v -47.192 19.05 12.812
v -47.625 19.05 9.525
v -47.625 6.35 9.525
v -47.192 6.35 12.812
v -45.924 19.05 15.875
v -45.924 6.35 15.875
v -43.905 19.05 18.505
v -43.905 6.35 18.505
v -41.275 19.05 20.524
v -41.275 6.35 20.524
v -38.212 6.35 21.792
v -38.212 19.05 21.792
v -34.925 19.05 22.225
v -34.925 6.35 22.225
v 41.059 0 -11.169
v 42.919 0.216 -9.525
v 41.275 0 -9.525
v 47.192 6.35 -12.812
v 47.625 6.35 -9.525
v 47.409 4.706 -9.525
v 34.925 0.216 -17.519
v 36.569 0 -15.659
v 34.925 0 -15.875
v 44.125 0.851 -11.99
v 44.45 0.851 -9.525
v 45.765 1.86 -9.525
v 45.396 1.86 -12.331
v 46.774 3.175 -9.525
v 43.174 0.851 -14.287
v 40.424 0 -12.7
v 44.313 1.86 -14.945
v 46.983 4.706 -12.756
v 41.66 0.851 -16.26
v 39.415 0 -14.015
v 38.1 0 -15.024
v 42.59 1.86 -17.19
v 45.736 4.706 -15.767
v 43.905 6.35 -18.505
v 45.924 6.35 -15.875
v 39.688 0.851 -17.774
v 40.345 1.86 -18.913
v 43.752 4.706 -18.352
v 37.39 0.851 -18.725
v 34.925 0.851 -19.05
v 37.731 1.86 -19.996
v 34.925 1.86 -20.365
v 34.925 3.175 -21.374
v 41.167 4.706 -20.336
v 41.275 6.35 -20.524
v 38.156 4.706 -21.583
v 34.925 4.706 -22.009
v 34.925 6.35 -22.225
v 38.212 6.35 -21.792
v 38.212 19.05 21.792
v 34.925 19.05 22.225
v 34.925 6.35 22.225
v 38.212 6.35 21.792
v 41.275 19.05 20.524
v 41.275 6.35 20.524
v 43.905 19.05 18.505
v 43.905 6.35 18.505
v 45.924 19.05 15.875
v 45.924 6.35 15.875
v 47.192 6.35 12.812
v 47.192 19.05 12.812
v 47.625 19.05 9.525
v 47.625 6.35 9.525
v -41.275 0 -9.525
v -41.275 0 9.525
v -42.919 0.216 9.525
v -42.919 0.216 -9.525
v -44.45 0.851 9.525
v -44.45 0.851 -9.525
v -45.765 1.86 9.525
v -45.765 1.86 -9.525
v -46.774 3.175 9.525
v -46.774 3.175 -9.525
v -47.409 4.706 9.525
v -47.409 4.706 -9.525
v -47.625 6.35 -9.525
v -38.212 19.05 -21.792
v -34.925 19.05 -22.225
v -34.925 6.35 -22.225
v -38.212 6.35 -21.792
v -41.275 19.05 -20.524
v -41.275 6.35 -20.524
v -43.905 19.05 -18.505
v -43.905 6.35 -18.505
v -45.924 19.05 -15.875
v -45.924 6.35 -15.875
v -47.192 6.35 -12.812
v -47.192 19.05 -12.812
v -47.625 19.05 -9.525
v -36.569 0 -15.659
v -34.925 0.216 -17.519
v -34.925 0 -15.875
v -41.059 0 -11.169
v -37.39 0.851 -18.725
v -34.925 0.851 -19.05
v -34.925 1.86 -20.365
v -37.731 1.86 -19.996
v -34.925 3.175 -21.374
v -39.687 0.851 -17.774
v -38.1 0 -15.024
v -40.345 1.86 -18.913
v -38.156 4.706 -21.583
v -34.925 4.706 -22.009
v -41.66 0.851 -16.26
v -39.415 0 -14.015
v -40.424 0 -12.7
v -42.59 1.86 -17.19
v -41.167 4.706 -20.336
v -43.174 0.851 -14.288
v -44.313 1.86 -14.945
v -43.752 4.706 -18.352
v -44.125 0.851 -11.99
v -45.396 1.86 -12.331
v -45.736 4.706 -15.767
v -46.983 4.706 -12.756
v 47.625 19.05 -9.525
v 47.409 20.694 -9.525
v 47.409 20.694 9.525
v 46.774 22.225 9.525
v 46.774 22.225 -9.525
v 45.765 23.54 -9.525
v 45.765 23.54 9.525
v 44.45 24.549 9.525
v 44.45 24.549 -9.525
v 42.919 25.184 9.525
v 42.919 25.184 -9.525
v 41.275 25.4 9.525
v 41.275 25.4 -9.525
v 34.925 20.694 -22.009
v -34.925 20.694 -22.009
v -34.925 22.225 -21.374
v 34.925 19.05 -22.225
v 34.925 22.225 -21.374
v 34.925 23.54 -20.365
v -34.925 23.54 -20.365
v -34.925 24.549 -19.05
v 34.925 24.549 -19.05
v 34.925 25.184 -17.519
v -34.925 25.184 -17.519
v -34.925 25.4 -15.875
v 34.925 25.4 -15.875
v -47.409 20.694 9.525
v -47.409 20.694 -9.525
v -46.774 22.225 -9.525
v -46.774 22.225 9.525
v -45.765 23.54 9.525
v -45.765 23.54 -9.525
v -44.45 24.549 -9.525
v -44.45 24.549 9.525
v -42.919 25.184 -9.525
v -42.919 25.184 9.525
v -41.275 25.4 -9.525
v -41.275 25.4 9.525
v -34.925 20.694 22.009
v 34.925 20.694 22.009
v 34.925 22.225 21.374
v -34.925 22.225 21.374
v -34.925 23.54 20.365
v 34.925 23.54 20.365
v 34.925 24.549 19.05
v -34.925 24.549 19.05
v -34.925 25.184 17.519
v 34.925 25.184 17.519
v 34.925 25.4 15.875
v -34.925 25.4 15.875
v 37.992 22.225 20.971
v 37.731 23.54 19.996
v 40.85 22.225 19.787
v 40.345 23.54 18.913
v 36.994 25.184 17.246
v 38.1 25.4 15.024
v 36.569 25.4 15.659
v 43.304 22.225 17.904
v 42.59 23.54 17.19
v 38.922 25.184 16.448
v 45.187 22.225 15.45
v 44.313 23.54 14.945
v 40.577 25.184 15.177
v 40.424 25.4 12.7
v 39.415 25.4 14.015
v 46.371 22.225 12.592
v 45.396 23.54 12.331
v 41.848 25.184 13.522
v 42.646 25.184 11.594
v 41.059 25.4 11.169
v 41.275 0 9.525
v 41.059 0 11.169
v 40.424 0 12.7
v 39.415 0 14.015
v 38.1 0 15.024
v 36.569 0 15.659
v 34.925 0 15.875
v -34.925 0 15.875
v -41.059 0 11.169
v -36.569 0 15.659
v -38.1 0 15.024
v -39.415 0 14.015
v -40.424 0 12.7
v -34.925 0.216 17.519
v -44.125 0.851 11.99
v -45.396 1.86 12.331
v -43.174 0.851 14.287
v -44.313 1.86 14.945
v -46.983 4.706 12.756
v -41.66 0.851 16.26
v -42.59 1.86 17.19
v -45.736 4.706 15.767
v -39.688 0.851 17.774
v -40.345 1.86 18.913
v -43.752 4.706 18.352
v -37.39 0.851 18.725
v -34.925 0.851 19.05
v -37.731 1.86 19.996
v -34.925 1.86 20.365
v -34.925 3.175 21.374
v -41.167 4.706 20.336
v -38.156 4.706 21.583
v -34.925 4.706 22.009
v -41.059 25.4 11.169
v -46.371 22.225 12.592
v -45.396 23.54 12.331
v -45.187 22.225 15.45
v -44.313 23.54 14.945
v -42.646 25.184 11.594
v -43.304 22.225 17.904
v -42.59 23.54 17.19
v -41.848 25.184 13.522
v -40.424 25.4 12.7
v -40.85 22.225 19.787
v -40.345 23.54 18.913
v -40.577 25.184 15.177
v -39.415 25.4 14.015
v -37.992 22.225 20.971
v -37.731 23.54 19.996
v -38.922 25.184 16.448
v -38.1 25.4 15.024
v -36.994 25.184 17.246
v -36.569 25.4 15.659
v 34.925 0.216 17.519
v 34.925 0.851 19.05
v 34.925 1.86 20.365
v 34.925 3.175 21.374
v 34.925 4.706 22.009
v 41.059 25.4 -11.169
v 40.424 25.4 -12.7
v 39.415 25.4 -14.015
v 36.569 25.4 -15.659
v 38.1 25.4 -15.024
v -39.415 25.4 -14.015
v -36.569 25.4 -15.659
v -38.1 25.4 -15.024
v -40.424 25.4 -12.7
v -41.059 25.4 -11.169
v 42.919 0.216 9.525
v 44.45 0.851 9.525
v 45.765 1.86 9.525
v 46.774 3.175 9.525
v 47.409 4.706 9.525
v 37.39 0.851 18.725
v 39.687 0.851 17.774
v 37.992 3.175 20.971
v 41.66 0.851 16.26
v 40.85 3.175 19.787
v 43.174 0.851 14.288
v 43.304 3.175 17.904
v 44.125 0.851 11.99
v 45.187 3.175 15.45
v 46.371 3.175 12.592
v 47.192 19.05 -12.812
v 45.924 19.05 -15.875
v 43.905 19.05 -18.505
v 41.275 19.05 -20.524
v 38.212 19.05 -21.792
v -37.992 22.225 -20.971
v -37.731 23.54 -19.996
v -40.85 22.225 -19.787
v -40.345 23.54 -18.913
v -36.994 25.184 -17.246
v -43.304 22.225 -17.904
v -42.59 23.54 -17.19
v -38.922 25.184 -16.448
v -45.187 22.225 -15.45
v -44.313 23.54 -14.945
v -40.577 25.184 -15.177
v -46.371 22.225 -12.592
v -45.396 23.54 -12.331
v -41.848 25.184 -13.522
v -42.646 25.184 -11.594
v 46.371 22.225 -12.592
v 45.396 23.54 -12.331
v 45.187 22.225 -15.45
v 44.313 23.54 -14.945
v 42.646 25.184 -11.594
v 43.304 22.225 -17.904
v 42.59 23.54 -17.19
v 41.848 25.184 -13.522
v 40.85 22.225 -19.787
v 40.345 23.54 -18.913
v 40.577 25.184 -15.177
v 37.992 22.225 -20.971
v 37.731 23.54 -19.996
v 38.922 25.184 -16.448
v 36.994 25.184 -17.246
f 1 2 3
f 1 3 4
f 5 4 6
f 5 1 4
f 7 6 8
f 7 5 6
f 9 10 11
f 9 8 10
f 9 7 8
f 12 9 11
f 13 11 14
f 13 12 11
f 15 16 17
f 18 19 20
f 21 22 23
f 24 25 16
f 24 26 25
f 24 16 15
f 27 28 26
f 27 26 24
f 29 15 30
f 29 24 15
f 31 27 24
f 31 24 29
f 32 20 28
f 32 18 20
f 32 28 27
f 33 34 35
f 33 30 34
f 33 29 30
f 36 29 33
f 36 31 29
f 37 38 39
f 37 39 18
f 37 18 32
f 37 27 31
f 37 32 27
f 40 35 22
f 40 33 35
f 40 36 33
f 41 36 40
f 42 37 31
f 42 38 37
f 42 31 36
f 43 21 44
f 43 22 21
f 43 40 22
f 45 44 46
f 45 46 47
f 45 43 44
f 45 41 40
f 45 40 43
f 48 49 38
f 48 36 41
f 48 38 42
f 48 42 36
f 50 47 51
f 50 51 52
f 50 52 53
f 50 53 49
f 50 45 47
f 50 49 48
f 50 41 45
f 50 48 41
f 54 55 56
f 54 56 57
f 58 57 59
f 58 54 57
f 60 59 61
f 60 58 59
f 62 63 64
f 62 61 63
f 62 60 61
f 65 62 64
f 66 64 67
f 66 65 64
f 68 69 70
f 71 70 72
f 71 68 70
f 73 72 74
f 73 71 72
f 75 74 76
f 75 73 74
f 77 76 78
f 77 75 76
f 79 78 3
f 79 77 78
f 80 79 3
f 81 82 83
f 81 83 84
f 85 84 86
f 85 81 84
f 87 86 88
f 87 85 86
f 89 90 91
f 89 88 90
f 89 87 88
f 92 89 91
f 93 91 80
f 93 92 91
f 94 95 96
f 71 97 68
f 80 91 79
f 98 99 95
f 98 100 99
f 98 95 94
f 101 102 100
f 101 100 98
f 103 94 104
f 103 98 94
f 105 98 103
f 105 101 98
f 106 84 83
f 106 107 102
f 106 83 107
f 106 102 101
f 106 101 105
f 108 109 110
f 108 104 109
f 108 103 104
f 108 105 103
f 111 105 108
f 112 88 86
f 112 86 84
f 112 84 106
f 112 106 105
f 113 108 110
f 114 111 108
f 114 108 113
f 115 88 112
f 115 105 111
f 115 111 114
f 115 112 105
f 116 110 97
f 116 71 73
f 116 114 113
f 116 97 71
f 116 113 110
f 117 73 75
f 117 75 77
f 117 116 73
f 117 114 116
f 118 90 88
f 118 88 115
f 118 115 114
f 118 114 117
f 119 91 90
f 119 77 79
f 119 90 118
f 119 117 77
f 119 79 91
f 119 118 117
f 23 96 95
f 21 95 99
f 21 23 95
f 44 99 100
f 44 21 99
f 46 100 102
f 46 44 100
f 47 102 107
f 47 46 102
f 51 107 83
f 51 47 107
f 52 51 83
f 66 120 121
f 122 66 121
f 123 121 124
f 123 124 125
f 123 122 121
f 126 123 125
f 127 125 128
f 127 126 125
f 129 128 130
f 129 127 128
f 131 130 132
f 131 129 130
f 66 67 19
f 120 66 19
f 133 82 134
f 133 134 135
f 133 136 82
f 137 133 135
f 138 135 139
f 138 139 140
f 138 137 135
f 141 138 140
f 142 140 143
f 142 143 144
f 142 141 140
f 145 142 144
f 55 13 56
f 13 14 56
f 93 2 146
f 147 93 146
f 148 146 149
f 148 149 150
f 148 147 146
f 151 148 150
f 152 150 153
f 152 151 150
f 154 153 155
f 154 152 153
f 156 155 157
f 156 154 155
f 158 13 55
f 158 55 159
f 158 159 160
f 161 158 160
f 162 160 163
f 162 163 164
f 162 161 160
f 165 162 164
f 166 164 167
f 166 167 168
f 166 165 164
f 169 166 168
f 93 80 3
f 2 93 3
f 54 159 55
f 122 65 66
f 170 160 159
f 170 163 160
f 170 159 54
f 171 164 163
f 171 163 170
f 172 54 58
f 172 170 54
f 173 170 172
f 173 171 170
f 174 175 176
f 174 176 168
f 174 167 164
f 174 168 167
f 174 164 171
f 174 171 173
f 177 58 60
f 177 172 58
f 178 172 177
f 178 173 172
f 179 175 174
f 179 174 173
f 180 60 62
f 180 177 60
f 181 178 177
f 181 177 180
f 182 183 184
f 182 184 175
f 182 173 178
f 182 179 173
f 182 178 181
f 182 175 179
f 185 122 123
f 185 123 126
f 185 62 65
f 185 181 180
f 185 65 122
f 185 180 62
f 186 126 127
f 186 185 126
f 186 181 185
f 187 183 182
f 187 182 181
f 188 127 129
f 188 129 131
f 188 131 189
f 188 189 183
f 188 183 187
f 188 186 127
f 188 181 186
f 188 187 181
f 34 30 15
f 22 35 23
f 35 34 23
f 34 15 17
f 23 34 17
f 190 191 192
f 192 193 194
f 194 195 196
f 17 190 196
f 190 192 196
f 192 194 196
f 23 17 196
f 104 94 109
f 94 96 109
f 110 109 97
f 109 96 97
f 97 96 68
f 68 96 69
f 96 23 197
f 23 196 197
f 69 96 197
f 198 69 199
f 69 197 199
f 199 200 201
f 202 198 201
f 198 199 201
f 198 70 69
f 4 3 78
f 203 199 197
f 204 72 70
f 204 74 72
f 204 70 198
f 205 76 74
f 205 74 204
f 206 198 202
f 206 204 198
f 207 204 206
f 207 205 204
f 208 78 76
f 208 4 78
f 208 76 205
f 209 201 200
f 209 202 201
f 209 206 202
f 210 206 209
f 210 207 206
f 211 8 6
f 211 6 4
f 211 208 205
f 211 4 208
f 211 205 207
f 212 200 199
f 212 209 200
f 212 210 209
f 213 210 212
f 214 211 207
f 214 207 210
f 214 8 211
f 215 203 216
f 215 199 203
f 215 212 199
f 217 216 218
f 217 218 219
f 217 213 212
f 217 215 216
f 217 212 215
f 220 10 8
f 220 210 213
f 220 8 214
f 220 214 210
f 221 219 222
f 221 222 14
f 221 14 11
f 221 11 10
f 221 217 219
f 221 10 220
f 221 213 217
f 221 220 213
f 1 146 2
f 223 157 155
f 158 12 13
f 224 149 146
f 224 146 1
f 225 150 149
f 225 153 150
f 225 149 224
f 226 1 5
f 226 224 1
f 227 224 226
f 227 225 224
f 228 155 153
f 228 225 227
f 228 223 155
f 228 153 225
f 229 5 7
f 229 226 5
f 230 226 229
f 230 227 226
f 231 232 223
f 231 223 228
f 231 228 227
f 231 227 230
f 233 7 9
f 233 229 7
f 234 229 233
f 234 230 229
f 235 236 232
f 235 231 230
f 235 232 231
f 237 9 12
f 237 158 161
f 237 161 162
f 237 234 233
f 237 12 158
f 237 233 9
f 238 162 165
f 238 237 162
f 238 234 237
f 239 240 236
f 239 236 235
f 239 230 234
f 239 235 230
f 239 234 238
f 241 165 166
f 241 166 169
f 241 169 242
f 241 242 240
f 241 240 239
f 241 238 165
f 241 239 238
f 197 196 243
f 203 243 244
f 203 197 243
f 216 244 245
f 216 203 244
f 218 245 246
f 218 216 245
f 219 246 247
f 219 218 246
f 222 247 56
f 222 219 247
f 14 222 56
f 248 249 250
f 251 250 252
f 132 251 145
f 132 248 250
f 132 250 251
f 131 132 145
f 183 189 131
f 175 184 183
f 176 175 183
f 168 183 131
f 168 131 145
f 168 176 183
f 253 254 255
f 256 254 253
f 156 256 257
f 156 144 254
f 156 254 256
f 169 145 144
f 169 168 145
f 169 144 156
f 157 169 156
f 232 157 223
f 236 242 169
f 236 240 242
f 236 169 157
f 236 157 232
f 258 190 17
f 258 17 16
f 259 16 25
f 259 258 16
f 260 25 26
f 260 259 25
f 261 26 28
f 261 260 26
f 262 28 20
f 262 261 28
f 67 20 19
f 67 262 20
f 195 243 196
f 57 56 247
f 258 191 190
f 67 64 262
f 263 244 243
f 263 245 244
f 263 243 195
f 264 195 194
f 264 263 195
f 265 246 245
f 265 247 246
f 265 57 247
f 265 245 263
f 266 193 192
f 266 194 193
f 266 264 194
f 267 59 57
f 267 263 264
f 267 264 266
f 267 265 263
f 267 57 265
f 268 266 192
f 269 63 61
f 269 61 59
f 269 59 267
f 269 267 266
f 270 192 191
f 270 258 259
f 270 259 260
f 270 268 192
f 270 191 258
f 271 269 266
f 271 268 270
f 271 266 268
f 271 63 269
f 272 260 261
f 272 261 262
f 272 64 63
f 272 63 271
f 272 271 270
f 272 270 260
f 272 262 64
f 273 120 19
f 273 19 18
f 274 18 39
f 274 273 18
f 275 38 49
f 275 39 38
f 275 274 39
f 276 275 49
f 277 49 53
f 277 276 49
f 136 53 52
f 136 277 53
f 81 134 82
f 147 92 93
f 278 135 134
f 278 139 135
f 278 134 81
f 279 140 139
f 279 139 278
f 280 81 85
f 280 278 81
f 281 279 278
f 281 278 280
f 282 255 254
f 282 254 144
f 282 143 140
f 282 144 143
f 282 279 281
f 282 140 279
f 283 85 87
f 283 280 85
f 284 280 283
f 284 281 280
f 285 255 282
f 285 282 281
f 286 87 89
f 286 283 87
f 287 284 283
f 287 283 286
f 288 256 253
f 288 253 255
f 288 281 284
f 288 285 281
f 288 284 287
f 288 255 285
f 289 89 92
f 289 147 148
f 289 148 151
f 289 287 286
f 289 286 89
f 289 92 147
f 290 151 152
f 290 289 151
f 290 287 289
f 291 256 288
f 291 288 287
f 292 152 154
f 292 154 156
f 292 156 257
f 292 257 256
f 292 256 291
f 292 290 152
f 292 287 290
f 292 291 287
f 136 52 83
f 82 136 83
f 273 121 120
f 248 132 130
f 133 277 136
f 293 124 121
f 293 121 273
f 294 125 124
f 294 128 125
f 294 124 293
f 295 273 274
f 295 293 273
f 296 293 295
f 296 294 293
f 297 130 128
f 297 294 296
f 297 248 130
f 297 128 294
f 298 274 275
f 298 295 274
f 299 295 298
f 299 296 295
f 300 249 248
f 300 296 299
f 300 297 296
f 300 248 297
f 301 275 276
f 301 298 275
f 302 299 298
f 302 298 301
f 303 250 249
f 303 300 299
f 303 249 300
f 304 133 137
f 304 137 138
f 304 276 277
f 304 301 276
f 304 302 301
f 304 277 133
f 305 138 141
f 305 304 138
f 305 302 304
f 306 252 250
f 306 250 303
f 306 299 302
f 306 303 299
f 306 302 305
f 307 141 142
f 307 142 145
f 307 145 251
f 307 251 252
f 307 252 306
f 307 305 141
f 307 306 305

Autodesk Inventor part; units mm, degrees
ref_plane "YZ Plane" through (0, 0, 0) normal (1, 0, 0) x (0, 1, 0)
ref_plane "XZ Plane" through (0, 0, 0) normal (0, 1, 0) x (-1, 0, 0)
ref_plane "XY Plane" through (0, 0, 0) normal (0, 0, 1) x (1, 0, 0)
sketch "Sketch1" plane through (0, 0, 0) normal (0, 1, 0) x (-1, 0, 0)
  line L0 (-47.625, -22.225) -> (47.625, -22.225)
  line L1 (47.625, -22.225) -> (47.625, 22.225)
  line L2 (47.625, 22.225) -> (-47.625, 22.225)
  line L3 (-47.625, 22.225) -> (-47.625, -22.225)
  line L4 (-47.625, -22.225) -> (47.625, 22.225) construction
  line L5 (47.625, -22.225) -> (-47.625, 22.225) construction
  point P0 (0, 0)
  dimension "d0" = 95.25
  dimension "d1" = 44.45
extrude "Extrusion1" add sketch "Sketch1" along normal blind 25.4
fillet "Fillet1" radius 12.7 4 edges at (-47.625, 12.7, 22.225) (47.625, 12.7, 22.225) (47.625, 12.7, -22.225) (-47.625, 12.7, -22.225)
fillet "Fillet2" radius 6.35 16 edges at (43.9053, 25.4, 18.5053) (47.625, 25.4, 0) (43.9053, 25.4, -18.5053) (0, 25.4, -22.225) (-43.9053, 25.4, -18.5053) (-47.625, 25.4, 0) (-43.9053, 25.4, 18.5053) (0, 25.4, 22.225) (43.9053, 0, 18.5053) (47.625, 0, 0) (43.9053, 0, -18.5053) (0, 0, -22.225) (-43.9053, 0, -18.5053) (-47.625, 0, 0) (-43.9053, 0, 18.5053) (0, 0, 22.225)
properties part number "am-3277"
